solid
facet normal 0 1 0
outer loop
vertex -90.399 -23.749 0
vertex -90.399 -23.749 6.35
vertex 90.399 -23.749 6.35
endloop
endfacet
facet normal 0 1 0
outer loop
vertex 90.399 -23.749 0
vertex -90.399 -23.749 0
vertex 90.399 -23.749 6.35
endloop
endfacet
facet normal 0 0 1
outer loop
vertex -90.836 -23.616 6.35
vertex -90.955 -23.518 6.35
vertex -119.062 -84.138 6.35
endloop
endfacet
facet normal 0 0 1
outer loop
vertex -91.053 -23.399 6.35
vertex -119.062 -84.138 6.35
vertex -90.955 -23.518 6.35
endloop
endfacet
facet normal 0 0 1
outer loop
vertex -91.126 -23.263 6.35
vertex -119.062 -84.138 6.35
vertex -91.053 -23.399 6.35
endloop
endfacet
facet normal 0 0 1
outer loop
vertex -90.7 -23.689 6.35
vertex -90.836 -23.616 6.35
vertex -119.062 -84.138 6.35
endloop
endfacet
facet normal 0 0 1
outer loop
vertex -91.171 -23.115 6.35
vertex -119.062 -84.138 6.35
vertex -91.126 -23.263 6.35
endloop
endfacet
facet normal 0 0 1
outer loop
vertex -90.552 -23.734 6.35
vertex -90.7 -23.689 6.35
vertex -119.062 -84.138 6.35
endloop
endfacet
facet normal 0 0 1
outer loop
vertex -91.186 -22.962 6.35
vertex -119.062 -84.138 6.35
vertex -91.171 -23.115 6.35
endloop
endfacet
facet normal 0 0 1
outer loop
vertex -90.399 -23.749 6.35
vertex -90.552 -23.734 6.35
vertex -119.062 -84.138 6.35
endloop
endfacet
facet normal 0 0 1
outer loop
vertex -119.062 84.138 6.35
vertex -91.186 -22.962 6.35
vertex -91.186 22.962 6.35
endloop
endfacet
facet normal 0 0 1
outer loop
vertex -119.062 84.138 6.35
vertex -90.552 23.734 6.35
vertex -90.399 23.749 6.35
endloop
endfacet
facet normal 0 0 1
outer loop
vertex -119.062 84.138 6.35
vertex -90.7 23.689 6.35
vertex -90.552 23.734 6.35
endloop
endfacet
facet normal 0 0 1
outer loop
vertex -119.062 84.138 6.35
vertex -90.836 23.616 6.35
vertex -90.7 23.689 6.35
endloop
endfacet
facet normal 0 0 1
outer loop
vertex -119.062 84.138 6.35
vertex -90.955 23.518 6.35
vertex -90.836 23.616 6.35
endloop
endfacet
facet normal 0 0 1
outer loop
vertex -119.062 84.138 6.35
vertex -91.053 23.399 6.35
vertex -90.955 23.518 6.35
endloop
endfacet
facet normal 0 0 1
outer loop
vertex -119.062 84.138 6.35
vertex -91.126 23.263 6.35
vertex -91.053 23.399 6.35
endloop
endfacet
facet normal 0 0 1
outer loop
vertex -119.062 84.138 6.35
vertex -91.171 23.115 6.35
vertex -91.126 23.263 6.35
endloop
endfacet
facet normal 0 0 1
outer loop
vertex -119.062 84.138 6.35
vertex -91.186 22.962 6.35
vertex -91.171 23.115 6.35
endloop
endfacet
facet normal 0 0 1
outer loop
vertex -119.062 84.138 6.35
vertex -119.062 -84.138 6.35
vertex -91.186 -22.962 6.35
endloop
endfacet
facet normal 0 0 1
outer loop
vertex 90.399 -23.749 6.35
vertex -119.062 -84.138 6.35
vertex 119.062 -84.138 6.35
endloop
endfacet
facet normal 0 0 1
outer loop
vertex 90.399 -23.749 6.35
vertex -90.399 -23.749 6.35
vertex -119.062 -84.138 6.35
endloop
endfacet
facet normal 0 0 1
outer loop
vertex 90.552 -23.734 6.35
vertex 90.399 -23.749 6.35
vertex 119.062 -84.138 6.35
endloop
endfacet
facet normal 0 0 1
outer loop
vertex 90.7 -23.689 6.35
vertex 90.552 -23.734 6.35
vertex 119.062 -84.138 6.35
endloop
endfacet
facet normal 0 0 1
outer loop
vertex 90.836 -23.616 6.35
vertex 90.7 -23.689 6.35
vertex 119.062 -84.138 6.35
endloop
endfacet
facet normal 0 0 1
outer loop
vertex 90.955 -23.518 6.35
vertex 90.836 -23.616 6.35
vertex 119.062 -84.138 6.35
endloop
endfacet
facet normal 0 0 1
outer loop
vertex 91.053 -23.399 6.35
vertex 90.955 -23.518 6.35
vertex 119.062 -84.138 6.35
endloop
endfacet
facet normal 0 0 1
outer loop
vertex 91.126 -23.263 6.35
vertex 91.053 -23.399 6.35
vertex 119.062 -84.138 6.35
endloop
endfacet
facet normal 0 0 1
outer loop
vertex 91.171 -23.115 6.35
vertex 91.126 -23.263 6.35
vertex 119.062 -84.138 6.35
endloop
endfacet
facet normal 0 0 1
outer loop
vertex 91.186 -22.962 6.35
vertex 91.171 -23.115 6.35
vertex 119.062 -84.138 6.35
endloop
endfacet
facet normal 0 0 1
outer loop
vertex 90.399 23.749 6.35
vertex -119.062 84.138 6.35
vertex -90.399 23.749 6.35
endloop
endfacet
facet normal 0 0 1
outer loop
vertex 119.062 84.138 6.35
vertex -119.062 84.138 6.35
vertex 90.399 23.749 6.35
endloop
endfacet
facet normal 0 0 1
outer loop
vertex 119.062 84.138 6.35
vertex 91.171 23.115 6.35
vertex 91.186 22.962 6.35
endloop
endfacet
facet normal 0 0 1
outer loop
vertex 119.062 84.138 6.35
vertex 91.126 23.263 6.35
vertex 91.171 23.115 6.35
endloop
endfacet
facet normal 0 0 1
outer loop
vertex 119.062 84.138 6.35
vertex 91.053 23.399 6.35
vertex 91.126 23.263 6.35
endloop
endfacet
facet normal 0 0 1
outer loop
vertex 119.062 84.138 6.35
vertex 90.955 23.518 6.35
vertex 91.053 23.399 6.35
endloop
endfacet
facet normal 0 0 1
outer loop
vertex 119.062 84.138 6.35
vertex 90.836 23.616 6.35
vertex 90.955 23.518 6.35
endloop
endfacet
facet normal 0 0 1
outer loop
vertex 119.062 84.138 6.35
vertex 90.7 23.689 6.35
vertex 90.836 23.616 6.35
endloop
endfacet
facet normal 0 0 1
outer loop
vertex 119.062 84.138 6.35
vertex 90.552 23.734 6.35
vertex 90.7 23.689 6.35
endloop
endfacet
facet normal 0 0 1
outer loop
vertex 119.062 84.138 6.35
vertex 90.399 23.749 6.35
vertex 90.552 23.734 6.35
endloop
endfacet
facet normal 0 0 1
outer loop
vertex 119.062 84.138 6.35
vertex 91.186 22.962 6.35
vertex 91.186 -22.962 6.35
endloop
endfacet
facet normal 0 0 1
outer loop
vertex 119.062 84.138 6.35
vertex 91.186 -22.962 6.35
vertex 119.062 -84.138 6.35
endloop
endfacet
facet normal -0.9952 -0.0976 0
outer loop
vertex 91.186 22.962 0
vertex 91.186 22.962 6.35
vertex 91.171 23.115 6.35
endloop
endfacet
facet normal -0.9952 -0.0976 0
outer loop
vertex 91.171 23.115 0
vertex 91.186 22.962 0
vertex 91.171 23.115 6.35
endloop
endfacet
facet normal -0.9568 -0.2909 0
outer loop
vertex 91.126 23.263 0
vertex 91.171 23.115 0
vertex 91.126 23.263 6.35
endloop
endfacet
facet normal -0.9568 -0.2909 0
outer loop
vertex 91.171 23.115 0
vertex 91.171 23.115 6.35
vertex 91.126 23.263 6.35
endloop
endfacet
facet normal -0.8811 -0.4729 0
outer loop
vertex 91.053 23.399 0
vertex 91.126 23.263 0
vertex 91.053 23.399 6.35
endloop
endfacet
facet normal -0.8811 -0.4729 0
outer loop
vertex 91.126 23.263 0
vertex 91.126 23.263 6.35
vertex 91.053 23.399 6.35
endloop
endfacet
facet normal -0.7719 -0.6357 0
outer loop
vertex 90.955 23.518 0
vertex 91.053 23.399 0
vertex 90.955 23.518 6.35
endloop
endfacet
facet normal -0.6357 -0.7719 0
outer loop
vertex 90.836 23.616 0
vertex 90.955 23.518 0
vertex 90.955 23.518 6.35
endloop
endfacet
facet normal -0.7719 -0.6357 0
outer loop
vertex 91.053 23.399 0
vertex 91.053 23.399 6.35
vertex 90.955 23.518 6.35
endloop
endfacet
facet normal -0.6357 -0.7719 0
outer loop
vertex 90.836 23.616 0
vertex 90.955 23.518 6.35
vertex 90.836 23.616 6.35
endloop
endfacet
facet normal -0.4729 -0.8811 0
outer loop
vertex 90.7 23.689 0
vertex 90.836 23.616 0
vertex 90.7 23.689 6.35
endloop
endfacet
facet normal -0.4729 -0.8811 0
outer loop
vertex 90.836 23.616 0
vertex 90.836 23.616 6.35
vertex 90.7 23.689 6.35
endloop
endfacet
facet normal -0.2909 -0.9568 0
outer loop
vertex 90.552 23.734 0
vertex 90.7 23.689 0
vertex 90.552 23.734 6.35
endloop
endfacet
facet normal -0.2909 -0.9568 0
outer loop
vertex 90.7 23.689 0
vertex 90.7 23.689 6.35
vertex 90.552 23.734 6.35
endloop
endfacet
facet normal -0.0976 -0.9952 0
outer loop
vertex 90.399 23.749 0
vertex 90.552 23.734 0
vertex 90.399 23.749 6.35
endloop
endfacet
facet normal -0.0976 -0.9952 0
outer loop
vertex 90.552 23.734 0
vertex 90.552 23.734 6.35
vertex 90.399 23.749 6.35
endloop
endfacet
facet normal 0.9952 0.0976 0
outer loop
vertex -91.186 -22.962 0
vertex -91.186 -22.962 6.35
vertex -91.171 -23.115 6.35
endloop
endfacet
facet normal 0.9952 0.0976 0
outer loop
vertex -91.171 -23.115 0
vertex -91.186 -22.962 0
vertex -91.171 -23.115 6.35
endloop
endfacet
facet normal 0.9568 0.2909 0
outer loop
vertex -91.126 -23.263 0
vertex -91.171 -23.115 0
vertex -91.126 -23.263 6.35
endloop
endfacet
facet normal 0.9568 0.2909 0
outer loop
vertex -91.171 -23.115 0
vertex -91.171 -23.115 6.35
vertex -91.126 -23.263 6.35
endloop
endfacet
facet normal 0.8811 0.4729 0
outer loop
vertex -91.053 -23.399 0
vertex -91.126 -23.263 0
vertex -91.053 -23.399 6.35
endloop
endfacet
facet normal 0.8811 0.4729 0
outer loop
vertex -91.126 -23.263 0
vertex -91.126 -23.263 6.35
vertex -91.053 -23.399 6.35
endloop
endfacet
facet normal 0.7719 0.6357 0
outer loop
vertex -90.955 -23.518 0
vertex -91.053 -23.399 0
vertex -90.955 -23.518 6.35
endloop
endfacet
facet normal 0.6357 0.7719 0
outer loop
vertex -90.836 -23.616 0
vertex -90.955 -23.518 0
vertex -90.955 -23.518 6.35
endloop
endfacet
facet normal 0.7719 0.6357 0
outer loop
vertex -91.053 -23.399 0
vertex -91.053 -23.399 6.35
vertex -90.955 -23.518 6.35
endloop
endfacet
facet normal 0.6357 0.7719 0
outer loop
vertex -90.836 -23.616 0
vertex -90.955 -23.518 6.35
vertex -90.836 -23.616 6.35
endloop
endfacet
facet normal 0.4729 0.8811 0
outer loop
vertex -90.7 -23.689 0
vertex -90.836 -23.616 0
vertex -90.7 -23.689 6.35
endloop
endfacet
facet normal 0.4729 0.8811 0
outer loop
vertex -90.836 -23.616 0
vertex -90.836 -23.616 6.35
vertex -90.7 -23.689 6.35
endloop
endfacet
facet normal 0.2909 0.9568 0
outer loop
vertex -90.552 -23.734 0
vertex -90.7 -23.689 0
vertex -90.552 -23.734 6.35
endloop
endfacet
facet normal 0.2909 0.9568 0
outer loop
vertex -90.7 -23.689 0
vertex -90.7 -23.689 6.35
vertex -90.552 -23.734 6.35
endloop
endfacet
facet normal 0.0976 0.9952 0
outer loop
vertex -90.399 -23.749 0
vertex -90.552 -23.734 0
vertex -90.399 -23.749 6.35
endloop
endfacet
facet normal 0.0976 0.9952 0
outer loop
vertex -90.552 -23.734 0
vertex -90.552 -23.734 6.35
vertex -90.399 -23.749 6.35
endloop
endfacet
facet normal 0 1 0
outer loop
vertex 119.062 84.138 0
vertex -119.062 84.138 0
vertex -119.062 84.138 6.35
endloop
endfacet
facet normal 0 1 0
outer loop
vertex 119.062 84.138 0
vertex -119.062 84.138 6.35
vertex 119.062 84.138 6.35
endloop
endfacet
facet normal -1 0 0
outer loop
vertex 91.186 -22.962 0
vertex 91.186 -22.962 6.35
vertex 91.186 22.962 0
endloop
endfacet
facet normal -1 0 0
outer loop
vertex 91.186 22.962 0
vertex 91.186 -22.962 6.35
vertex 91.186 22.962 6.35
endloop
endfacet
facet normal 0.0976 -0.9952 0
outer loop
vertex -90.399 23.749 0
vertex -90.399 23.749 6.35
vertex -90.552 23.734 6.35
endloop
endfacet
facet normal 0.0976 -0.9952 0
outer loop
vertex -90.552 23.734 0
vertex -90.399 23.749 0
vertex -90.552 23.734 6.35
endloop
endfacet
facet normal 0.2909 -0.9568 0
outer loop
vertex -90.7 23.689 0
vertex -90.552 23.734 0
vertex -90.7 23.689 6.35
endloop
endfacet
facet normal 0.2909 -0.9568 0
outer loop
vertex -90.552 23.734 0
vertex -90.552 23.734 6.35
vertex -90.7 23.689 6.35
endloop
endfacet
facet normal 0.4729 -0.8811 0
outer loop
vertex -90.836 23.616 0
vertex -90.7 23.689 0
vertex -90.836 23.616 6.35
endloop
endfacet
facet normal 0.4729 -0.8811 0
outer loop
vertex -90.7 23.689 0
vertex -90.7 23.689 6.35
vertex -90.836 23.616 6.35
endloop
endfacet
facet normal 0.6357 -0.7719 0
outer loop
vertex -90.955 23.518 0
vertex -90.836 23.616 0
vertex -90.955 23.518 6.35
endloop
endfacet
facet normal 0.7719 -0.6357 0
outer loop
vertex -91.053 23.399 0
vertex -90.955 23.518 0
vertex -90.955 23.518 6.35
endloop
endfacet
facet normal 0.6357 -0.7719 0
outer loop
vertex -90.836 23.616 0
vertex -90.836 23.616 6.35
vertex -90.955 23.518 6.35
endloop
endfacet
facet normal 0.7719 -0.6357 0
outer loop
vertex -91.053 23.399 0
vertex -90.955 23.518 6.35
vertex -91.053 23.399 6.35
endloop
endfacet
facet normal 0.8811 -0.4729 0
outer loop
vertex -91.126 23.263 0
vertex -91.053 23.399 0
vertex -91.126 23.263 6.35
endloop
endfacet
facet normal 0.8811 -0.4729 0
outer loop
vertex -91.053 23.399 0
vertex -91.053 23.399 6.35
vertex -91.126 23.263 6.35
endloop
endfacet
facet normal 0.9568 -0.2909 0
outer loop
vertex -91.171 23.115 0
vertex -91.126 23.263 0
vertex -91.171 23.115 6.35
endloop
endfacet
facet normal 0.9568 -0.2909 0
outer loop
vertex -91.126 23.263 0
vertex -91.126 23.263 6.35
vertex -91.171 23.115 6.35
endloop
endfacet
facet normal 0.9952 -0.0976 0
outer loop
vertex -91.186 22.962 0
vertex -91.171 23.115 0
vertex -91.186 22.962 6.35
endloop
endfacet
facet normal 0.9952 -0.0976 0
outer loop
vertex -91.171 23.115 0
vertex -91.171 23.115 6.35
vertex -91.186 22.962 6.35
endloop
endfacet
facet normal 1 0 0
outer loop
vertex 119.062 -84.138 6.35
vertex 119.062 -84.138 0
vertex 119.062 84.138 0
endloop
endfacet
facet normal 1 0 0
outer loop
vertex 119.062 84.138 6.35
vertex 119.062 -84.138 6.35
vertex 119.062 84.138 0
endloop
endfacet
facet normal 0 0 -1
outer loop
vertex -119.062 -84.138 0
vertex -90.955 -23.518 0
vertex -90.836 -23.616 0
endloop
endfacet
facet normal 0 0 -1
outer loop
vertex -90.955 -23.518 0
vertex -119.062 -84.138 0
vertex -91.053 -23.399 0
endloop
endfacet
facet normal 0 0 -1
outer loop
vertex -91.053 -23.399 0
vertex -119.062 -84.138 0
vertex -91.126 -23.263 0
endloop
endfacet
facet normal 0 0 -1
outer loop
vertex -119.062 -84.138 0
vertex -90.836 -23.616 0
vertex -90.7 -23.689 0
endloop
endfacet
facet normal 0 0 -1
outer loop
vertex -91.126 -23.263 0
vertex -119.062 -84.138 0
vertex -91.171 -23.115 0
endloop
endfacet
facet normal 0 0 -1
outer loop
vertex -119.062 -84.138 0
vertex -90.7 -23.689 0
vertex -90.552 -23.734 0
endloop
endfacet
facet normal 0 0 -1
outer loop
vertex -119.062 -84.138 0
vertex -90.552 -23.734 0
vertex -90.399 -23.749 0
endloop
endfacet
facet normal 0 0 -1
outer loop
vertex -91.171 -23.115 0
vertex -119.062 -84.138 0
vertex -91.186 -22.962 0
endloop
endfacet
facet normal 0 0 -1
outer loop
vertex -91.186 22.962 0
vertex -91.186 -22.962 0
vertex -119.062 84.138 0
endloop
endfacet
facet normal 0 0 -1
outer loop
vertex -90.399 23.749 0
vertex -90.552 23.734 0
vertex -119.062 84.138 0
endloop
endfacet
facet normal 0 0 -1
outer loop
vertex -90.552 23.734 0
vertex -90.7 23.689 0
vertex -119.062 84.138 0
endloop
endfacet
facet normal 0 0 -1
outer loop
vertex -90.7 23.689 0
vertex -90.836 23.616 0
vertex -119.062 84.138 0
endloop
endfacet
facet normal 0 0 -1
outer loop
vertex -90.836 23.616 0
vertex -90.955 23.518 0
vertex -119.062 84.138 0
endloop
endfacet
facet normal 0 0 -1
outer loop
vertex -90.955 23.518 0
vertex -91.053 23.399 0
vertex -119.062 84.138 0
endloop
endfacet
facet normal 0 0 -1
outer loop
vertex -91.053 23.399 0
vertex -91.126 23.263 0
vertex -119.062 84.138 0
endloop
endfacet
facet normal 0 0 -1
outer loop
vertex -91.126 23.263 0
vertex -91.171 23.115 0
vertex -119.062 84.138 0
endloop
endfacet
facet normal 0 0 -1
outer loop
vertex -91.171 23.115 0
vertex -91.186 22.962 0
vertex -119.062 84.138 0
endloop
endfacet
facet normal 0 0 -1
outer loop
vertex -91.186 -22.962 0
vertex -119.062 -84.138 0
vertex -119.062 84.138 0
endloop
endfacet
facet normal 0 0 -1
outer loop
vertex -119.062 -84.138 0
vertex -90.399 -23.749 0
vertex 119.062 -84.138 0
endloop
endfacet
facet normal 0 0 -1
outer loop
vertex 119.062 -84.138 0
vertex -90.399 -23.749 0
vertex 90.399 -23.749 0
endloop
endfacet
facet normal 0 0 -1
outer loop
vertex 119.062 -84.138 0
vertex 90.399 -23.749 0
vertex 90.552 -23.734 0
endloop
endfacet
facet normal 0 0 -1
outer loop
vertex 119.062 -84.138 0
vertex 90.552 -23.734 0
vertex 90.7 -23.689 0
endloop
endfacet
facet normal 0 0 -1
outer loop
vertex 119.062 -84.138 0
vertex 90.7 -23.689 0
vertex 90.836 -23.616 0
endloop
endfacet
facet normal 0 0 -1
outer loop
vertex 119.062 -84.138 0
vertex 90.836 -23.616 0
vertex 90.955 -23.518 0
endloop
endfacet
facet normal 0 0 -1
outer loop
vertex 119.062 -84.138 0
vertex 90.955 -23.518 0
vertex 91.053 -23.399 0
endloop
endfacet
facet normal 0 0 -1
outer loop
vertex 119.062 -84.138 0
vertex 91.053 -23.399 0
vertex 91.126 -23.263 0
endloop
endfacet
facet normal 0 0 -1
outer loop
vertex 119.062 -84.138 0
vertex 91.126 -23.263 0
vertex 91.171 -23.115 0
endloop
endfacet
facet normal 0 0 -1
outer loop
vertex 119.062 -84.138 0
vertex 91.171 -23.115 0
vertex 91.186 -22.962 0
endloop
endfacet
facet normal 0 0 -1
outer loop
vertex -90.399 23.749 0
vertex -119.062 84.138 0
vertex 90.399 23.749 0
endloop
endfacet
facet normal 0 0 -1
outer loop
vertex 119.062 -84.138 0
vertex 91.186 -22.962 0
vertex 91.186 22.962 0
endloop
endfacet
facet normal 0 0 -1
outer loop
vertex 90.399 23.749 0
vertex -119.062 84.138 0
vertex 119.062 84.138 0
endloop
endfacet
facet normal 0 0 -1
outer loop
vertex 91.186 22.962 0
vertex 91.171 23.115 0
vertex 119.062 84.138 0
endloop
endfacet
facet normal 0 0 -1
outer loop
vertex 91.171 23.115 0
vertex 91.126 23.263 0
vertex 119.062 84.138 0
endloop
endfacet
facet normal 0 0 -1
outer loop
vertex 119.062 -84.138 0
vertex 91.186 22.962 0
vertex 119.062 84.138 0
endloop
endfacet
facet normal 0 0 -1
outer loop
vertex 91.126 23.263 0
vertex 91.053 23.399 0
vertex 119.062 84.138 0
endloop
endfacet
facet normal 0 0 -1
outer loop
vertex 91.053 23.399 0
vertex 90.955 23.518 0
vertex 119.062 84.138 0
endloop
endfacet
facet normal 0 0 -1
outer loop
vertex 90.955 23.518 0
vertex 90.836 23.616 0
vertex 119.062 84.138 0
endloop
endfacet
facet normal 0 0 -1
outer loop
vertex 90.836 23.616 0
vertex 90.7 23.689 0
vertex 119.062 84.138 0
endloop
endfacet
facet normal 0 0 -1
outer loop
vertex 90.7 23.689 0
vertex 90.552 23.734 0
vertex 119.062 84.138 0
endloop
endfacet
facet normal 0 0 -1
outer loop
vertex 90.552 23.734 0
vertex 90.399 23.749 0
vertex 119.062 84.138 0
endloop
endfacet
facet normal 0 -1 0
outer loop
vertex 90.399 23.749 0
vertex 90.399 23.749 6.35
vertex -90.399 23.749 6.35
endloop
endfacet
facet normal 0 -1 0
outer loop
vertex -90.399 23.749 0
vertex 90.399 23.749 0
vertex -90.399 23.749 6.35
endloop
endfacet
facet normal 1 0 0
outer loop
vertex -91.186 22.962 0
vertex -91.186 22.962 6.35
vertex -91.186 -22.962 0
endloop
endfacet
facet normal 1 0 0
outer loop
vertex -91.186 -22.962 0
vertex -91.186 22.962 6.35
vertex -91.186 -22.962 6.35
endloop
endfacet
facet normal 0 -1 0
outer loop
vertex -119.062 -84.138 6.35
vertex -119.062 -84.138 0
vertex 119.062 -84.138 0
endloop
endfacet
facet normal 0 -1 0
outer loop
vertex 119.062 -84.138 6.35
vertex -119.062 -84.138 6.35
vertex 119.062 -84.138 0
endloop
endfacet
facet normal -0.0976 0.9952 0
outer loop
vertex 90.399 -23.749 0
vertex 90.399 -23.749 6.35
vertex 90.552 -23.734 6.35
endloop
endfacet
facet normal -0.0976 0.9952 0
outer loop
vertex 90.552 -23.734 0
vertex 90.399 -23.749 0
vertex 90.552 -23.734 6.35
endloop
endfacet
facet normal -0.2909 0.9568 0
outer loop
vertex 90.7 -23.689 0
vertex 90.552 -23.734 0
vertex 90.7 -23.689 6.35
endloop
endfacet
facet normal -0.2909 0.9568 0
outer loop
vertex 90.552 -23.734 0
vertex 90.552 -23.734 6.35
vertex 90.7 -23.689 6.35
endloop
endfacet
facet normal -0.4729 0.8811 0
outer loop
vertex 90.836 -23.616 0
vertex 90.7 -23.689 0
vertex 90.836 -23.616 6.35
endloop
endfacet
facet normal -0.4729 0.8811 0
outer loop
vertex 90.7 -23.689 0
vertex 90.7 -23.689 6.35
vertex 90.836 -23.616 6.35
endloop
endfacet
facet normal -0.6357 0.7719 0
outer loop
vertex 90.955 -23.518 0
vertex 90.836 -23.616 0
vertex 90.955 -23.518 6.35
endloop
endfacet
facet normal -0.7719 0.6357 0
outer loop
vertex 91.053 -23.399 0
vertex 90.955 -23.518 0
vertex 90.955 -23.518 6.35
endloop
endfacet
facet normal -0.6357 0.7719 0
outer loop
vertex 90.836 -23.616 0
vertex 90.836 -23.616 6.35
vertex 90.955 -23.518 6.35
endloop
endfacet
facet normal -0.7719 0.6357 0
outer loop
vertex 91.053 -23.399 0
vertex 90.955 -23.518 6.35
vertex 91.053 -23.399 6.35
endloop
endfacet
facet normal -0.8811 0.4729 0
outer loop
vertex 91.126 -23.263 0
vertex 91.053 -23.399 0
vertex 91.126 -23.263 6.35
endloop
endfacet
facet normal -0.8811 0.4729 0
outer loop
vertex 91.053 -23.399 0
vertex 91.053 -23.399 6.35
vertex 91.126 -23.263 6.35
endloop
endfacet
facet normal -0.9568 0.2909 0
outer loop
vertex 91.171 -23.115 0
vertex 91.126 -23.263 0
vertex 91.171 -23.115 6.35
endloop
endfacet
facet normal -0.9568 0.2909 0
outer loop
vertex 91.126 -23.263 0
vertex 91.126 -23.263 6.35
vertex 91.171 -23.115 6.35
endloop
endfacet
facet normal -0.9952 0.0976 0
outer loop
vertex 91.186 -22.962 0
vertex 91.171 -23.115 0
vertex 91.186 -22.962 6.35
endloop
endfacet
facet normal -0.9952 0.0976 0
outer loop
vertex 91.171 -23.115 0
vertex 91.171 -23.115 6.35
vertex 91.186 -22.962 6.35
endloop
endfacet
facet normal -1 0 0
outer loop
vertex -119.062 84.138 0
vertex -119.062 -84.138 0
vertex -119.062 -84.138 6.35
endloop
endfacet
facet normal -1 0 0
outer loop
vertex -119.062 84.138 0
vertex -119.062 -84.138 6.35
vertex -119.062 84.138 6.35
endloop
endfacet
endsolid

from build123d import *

# Parameters (mm, degrees)
F0_W     = 238.125
F0_H     = 168.275
F1_DEPTH = 6.35
F2_W     = 179.832
F2_H     = 44.958
F3_DEPTH = 25.4
F5_DEPTH = 6.351


# Not quite as in the source:
# - a feature of the source that left no trace in its solid (it failed there, or was rolled back) is left out


with BuildPart() as f1:
    # F0 (on Top) → F1 (new body)
    with BuildSketch(Plane.XY):
        Rectangle(F0_W, F0_H)
    extrude(amount=F1_DEPTH)

    # F2 (on face) → F3 (cut)
    with BuildSketch(Plane.XY.offset(6.35)):
        Rectangle(F2_W, F2_H)
    extrude(amount=-F3_DEPTH, mode=Mode.SUBTRACT)

    # F4 (on face) → F5 (cut, through all)
    with BuildSketch(Plane.XY.offset(6.35)):
        with BuildLine():
            Line((90.3986, 23.749), (-90.3986, 23.749))
            ThreePointArc((-90.3986, 23.749), (-90.9553758795, 23.5183758795), (-91.186, 22.9616))
            Line((-91.186, 22.9616), (-91.186, -22.9616))
            ThreePointArc((-91.186, -22.9616), (-90.9553758795, -23.5183758795), (-90.3986, -23.749))
            Line((-90.3986, -23.749), (90.3986, -23.749))
            ThreePointArc((90.3986, -23.749), (90.9553758795, -23.5183758795), (91.186, -22.9616))
            Line((91.186, -22.9616), (91.186, 22.9616))
            ThreePointArc((91.186, 22.9616), (90.9553758795, 23.5183758795), (90.3986, 23.749))
        make_face()
    extrude(amount=-F5_DEPTH, mode=Mode.SUBTRACT)


solid = f1.part
